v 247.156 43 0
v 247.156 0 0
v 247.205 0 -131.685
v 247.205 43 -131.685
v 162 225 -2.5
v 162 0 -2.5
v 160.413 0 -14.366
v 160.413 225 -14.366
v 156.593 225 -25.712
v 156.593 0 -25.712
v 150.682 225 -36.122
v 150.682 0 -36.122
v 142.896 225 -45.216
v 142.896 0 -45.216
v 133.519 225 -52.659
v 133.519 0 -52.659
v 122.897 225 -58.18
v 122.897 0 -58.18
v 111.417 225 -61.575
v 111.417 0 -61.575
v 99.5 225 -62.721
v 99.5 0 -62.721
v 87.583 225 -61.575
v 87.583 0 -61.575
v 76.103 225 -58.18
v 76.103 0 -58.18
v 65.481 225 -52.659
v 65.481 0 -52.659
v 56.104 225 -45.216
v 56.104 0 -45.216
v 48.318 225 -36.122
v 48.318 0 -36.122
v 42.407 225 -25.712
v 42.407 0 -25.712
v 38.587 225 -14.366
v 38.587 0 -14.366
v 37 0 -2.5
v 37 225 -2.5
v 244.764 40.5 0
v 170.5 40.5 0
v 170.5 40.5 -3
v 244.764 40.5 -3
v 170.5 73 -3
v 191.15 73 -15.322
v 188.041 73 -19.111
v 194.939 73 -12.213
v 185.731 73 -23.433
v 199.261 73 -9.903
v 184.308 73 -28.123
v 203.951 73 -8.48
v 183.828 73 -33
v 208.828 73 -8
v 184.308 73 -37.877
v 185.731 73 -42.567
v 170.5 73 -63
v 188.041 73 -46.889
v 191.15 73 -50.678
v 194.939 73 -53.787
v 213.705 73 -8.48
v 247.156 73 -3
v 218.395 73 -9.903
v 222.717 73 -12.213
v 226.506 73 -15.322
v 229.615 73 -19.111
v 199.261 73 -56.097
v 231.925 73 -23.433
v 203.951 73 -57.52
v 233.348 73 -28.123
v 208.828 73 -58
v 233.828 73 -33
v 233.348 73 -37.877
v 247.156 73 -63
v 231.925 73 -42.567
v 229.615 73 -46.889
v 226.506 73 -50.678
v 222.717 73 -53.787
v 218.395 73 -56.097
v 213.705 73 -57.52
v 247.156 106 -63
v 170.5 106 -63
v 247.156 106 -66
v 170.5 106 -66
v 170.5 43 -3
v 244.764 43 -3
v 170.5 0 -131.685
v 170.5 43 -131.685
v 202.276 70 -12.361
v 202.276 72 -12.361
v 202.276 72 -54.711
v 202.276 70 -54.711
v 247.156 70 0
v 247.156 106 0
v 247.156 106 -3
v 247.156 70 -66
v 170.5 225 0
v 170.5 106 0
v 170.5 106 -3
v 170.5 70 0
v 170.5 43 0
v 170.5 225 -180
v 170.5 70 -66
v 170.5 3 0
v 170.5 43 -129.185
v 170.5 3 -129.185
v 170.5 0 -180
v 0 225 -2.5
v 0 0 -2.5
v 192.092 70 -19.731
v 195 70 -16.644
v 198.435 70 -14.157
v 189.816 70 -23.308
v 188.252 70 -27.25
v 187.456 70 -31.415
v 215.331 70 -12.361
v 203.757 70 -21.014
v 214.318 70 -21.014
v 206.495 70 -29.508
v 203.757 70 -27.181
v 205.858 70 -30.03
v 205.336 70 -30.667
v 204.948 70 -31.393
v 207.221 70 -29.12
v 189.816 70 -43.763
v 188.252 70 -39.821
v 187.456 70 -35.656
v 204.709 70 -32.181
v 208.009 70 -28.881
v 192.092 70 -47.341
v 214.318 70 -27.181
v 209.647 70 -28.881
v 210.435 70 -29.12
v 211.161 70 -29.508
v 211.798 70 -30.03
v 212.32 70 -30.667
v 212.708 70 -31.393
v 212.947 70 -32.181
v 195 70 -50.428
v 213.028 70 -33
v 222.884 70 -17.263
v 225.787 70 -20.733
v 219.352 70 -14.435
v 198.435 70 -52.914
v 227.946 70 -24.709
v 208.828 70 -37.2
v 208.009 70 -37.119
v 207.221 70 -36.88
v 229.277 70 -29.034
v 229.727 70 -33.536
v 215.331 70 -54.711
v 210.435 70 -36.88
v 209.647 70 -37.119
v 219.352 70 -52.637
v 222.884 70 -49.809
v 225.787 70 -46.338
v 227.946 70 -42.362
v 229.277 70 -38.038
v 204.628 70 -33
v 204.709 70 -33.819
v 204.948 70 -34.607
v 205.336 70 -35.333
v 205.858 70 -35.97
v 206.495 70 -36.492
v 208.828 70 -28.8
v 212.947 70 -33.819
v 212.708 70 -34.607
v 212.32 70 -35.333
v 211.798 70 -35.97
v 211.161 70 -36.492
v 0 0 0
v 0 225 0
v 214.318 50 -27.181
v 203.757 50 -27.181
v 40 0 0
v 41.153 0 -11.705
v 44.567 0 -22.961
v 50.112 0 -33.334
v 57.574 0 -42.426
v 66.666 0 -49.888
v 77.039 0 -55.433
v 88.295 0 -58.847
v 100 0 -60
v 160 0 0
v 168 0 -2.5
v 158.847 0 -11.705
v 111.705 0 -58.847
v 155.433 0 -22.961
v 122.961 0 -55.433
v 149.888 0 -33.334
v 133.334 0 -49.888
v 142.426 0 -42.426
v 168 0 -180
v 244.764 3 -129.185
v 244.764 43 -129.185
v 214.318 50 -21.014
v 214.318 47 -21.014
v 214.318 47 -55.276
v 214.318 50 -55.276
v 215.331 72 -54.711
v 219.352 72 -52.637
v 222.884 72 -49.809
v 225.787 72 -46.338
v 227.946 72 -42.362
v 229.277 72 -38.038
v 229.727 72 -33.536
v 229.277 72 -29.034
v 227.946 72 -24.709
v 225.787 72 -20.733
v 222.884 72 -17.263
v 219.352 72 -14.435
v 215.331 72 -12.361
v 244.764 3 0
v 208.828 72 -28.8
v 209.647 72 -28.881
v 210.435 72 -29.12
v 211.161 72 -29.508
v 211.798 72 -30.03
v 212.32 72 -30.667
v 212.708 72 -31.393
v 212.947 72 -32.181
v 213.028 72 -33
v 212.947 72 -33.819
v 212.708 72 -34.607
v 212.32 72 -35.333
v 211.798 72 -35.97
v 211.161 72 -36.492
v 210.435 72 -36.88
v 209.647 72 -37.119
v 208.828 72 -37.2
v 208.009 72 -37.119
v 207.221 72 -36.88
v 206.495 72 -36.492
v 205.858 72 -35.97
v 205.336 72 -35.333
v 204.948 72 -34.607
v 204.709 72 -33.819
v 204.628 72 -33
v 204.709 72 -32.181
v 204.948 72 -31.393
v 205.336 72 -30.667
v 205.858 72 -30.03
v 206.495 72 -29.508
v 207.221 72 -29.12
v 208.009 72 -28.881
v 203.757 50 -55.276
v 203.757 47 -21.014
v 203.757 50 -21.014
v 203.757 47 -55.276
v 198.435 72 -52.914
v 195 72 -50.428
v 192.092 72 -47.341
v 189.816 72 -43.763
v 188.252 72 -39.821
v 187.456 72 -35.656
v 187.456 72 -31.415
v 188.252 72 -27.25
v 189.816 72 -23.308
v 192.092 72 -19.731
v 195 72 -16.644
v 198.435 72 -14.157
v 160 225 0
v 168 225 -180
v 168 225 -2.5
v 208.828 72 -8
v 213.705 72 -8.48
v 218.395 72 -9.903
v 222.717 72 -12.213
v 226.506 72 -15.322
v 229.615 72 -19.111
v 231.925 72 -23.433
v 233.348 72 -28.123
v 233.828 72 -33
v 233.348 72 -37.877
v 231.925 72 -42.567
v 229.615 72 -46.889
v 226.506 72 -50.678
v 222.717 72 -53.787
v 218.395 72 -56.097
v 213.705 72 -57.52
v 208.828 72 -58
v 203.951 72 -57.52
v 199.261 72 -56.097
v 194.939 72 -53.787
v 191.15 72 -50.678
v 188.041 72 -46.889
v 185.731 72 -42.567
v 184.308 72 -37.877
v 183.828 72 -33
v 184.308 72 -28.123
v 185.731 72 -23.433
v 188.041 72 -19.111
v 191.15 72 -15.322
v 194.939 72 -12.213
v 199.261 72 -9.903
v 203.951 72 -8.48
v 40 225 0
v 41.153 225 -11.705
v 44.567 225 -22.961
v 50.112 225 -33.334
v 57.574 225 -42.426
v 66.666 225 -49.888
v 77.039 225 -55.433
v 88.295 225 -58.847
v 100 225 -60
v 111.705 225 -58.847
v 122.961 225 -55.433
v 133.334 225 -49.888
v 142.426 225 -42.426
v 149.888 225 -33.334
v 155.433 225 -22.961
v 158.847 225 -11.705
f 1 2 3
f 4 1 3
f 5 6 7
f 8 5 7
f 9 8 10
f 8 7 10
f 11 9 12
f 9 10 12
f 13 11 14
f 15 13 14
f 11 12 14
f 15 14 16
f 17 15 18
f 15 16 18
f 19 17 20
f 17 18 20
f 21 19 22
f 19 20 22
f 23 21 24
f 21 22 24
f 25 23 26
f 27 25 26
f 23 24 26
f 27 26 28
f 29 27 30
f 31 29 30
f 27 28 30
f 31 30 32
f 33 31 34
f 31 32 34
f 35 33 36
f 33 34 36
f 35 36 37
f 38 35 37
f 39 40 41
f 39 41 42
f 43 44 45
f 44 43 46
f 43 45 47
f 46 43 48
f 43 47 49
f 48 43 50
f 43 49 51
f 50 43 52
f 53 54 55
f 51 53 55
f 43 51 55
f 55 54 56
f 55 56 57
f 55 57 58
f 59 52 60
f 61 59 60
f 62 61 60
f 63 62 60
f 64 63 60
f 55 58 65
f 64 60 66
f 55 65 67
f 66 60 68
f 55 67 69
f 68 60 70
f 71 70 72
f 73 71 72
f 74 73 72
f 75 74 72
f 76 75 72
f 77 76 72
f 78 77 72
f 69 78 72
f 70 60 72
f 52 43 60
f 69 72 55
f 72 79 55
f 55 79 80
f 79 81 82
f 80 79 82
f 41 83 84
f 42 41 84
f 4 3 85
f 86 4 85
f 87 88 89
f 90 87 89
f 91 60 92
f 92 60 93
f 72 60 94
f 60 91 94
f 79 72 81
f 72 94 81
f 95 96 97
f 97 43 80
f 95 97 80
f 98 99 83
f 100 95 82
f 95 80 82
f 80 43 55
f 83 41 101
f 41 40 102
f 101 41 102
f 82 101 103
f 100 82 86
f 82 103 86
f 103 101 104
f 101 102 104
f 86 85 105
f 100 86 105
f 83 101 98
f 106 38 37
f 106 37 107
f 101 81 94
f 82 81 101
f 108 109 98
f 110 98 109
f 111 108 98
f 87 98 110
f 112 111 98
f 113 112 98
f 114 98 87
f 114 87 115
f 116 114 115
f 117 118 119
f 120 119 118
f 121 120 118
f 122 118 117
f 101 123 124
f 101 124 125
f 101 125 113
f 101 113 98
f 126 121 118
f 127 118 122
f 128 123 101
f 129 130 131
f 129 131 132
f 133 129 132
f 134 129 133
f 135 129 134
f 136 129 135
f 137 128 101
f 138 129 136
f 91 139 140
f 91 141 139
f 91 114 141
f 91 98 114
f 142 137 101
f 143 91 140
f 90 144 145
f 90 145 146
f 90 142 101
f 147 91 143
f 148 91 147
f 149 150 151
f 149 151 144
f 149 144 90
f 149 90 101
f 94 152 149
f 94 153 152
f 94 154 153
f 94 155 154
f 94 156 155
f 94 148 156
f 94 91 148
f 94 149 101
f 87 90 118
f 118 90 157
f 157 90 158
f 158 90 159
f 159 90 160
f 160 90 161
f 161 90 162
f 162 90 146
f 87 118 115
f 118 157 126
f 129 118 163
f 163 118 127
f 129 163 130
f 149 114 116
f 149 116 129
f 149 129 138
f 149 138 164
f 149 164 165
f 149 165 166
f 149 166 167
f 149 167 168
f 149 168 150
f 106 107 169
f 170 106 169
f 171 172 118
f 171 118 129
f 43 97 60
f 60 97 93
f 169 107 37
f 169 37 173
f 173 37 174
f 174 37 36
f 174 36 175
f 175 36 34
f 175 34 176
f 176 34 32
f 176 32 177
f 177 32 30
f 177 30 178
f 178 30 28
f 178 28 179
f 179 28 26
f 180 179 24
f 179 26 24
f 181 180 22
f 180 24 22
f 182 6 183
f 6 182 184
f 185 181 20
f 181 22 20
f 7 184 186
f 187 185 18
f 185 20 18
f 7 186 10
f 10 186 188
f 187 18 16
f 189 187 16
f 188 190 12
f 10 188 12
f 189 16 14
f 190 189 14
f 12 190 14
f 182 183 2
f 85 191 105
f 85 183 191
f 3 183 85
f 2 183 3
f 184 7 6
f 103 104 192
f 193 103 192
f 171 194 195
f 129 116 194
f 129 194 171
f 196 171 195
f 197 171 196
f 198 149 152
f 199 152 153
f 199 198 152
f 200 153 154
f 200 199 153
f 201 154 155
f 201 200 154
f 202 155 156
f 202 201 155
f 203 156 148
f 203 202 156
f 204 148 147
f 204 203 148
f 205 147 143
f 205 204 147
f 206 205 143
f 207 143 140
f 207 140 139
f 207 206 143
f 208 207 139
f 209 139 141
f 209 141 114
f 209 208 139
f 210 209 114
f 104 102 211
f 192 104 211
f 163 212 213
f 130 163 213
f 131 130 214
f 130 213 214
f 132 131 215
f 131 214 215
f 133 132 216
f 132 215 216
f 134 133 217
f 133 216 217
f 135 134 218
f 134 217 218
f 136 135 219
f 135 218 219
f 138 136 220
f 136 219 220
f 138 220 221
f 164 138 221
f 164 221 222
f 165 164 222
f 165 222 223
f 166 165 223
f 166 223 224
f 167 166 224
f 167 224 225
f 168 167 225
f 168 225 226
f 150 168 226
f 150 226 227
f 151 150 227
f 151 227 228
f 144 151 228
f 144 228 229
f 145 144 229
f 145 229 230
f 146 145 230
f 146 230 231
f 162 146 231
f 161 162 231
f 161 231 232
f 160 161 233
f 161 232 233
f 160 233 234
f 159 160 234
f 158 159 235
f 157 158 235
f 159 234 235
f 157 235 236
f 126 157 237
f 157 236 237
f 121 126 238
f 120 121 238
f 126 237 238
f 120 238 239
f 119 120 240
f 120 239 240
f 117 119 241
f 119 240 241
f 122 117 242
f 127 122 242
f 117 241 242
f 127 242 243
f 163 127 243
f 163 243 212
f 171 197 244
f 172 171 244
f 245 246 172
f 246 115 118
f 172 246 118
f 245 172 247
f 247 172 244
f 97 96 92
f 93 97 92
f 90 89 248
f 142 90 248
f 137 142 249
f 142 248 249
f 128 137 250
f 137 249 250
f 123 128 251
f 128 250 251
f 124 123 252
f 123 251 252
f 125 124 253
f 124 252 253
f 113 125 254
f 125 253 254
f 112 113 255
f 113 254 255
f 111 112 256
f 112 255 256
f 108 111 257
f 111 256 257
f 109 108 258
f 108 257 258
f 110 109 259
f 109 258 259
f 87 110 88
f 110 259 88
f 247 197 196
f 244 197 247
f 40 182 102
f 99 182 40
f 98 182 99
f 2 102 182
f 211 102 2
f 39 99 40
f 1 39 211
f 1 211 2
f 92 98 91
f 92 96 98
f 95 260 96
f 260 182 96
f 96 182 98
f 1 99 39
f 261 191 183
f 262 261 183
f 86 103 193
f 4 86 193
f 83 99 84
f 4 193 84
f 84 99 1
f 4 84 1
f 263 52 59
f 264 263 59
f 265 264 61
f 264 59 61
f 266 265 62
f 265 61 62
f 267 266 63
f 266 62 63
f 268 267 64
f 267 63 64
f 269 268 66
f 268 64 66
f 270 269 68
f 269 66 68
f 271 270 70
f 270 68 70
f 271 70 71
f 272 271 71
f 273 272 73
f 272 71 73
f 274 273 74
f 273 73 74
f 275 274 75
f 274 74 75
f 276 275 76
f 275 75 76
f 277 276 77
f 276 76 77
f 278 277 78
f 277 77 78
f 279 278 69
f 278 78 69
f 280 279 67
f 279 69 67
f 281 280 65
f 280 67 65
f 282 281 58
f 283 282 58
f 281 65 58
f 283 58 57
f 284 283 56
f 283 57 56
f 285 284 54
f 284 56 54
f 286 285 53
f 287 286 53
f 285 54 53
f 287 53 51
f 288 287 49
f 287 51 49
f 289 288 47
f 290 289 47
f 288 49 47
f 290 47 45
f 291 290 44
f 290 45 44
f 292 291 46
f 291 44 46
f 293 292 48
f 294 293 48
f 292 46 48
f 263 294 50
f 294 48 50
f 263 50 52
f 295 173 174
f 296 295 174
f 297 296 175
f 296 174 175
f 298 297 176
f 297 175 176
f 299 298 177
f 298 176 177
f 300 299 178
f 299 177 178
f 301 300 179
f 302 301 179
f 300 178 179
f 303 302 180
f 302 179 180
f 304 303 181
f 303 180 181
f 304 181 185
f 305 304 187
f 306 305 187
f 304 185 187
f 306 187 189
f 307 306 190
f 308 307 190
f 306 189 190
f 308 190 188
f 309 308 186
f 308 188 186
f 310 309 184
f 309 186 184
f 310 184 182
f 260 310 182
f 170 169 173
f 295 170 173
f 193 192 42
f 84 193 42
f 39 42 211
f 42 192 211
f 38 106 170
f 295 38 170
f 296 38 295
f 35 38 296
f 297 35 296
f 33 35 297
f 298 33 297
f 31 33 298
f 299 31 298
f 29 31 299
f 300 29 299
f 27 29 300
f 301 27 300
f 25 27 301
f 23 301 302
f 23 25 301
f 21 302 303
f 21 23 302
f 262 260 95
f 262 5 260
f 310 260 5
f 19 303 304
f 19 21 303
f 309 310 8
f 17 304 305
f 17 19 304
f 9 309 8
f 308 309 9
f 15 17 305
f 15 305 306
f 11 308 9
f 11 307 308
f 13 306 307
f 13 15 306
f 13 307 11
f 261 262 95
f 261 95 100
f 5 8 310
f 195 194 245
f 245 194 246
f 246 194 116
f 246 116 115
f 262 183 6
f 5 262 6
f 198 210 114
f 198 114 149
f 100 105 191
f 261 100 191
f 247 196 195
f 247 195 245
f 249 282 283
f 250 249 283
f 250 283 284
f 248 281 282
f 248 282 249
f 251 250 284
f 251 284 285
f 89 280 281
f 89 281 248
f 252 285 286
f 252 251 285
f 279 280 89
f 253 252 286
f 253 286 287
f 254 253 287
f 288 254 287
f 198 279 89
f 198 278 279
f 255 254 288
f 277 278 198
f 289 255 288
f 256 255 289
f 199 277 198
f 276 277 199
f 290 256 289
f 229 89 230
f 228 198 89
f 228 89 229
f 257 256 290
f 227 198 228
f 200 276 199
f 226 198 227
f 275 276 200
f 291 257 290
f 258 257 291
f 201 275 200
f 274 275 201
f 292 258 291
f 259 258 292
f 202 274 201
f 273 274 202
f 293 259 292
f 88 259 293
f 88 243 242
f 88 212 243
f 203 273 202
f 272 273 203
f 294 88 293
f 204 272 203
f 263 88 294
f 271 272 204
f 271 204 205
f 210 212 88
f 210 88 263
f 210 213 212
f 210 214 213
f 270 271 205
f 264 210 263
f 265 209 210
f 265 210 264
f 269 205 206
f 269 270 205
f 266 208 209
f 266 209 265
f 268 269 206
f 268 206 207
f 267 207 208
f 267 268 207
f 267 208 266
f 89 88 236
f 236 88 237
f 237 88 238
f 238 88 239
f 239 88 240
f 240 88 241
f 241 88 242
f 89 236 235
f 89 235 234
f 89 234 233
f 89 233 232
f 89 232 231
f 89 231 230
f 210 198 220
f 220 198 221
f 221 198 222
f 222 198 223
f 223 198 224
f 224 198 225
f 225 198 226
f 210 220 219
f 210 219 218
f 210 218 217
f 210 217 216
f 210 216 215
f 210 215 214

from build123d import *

# Parameters (mm, degrees)
EXTRUDE_1_DEPTH     = 225
SKETCH_3_W          = 66
SKETCH_3_H          = 76.655878063
EXTRUDE_2_DEPTH     = 3
SKETCH_4_W          = 76.655878063
SKETCH_4_H          = 33
EXTRUDE_3_DEPTH     = 3
SKETCH_5_W          = 76.655878063
SKETCH_5_H          = 33
EXTRUDE_4_DEPTH     = 3
SKETCH_7_R          = 25
CUT_EXTRUDE_1_DEPTH = 1
SKETCH_8_R          = 4.2
CUT_EXTRUDE_2_DEPTH = 3
CUT_EXTRUDE_3_DEPTH = 3
SKETCH_10_W         = 6.167449304
SKETCH_10_H         = 10.561253057
EXTRUDE_5_DEPTH     = 20
SKETCH_11_W         = 10.561253057
SKETCH_11_H         = 34.261699871
EXTRUDE_6_DEPTH     = 3
EXTRUDE_7_DEPTH     = 3
EXTRUDE_8_DEPTH     = 43
SKETCH_15_W         = 76.655878063
SKETCH_15_H         = 2.5
EXTRUDE_9_DEPTH     = 3


with BuildPart() as part:
    # 草图1 → 凸台-拉伸1 (new body)
    with BuildSketch(Plane(origin=(0, 0, 0), x_dir=(1, 0, 0), z_dir=(0, 1, 0))):
        with BuildLine():
            Line((0, 0), (40, 0))
            ThreePointArc((40, 0), (100, 60), (160, 0))
            Line((160, 0), (170.5, 0))
            Line((170.5, 0), (170.5, 180))
            Line((170.5, 180), (168, 180))
            Line((168, 180), (168, 2.5))
            Line((168, 2.5), (162, 2.5))
            ThreePointArc((162, 2.5), (99.5, 62.720665032), (37, 2.5))
            Line((37, 2.5), (0, 2.5))
            Line((0, 2.5), (0, 0))
        make_face()
    extrude(amount=EXTRUDE_1_DEPTH)

    # 草图3 → 凸台-拉伸2 (add)
    with BuildSketch(Plane(origin=(0, 70, 0), x_dir=(0, 0, -1), z_dir=(0, -1, 0))):
        with Locations((33, 208.827939032)):
            Rectangle(SKETCH_3_W, SKETCH_3_H)
    extrude(amount=-EXTRUDE_2_DEPTH)

    # 草图4 → 凸台-拉伸3 (add)
    with BuildSketch(Plane.XY):
        with Locations((208.827939032, 89.5)):
            Rectangle(SKETCH_4_W, SKETCH_4_H)
    extrude(amount=-EXTRUDE_3_DEPTH)

    # 草图5 → 凸台-拉伸4 (add)
    with BuildSketch(Plane(origin=(0, 0, -66), x_dir=(-1, 0, 0), z_dir=(0, 0, -1))):
        with Locations((-208.827939032, 89.5)):
            Rectangle(SKETCH_5_W, SKETCH_5_H)
    extrude(amount=-EXTRUDE_4_DEPTH)

    # 草图7 → 切除-拉伸1 (cut)
    with BuildSketch(Plane(origin=(0, 73, 0), x_dir=(1, 0, 0), z_dir=(0, 1, 0))):
        with Locations(Location((208.827939031, 33, 0), (0, 0, 270))):
            Circle(SKETCH_7_R)
    extrude(amount=-CUT_EXTRUDE_1_DEPTH, mode=Mode.SUBTRACT)

    # 草图8 → 切除-拉伸2 (cut)
    with BuildSketch(Plane(origin=(0, 73, 0), x_dir=(1, 0, 0), z_dir=(0, 1, 0))):
        with Locations(Location((208.827939031, 33, 0), (0, 0, 270))):
            Circle(SKETCH_8_R)
    extrude(amount=-CUT_EXTRUDE_2_DEPTH, mode=Mode.SUBTRACT)

    # 草图9 → 切除-拉伸3 (cut)
    with BuildSketch(Plane(origin=(0, 73, 0), x_dir=(1, 0, 0), z_dir=(0, 1, 0))):
        with BuildLine():
            Line((202.276441695, 38.603794928), (202.276441695, 54.71078199))
            ThreePointArc((202.276441695, 54.71078199), (187.355723059, 33.535648138), (202.276441695, 12.360514285))
            Line((202.276441695, 12.360514285), (202.276441695, 26.245847959))
            Line((202.276441695, 26.245847959), (202.276441695, 38.603794928))
        make_face()
        with BuildLine():
            ThreePointArc((215.331215104, 54.71078199), (229.726697753, 33.535648138), (215.331215104, 12.360514285))
            Line((215.331215104, 12.360514285), (215.331215104, 26.245847959))
            Line((215.331215104, 26.245847959), (215.331215104, 38.603794928))
            Line((215.331215104, 38.603794928), (215.331215104, 54.71078199))
        make_face()
    extrude(amount=-CUT_EXTRUDE_3_DEPTH, mode=Mode.SUBTRACT)

    # 草图10 → 凸台-拉伸5 (add)
    with BuildSketch(Plane(origin=(0, 70, 0), x_dir=(0, 0, -1), z_dir=(0, -1, 0))):
        with Locations((24.097577195, 209.037691234)):
            Rectangle(SKETCH_10_W, SKETCH_10_H)
    extrude(amount=EXTRUDE_5_DEPTH)

    # 草图11 → 凸台-拉伸6 (add)
    with BuildSketch(Plane(origin=(0, 50, 0), x_dir=(-1, 0, 0), z_dir=(0, -1, 0))):
        with Locations((-209.037691234, 38.144702479)):
            Rectangle(SKETCH_11_W, SKETCH_11_H)
    extrude(amount=EXTRUDE_6_DEPTH)

    # 草图12 → 凸台-拉伸7 (add)
    with BuildSketch(Plane(origin=(0, 0, 0), x_dir=(1, 0, 0), z_dir=(0, 1, 0))):
        Polygon((170.5, 0), (247.155878063, 0), (247.205159598, 131.685407984), (170.5, 131.685407984), align=None)
    extrude(amount=EXTRUDE_7_DEPTH)

    # 草图13 → 凸台-拉伸8 (add)
    with BuildSketch(Plane(origin=(0, 0, 0), x_dir=(1, 0, 0), z_dir=(0, 1, 0))):
        Polygon((247.155878063, 0), (247.205159598, 131.685407984), (170.5, 131.685407984), (170.5, 129.185407984), (244.763652704, 129.185407984), (244.763652704, 0), align=None)
    extrude(amount=EXTRUDE_8_DEPTH)

    # 草图15 → 凸台-拉伸9 (add)
    with BuildSketch(Plane.XY):
        with Locations((208.827939032, 41.75)):
            Rectangle(SKETCH_15_W, SKETCH_15_H)
    extrude(amount=-EXTRUDE_9_DEPTH)


solid = part.part
